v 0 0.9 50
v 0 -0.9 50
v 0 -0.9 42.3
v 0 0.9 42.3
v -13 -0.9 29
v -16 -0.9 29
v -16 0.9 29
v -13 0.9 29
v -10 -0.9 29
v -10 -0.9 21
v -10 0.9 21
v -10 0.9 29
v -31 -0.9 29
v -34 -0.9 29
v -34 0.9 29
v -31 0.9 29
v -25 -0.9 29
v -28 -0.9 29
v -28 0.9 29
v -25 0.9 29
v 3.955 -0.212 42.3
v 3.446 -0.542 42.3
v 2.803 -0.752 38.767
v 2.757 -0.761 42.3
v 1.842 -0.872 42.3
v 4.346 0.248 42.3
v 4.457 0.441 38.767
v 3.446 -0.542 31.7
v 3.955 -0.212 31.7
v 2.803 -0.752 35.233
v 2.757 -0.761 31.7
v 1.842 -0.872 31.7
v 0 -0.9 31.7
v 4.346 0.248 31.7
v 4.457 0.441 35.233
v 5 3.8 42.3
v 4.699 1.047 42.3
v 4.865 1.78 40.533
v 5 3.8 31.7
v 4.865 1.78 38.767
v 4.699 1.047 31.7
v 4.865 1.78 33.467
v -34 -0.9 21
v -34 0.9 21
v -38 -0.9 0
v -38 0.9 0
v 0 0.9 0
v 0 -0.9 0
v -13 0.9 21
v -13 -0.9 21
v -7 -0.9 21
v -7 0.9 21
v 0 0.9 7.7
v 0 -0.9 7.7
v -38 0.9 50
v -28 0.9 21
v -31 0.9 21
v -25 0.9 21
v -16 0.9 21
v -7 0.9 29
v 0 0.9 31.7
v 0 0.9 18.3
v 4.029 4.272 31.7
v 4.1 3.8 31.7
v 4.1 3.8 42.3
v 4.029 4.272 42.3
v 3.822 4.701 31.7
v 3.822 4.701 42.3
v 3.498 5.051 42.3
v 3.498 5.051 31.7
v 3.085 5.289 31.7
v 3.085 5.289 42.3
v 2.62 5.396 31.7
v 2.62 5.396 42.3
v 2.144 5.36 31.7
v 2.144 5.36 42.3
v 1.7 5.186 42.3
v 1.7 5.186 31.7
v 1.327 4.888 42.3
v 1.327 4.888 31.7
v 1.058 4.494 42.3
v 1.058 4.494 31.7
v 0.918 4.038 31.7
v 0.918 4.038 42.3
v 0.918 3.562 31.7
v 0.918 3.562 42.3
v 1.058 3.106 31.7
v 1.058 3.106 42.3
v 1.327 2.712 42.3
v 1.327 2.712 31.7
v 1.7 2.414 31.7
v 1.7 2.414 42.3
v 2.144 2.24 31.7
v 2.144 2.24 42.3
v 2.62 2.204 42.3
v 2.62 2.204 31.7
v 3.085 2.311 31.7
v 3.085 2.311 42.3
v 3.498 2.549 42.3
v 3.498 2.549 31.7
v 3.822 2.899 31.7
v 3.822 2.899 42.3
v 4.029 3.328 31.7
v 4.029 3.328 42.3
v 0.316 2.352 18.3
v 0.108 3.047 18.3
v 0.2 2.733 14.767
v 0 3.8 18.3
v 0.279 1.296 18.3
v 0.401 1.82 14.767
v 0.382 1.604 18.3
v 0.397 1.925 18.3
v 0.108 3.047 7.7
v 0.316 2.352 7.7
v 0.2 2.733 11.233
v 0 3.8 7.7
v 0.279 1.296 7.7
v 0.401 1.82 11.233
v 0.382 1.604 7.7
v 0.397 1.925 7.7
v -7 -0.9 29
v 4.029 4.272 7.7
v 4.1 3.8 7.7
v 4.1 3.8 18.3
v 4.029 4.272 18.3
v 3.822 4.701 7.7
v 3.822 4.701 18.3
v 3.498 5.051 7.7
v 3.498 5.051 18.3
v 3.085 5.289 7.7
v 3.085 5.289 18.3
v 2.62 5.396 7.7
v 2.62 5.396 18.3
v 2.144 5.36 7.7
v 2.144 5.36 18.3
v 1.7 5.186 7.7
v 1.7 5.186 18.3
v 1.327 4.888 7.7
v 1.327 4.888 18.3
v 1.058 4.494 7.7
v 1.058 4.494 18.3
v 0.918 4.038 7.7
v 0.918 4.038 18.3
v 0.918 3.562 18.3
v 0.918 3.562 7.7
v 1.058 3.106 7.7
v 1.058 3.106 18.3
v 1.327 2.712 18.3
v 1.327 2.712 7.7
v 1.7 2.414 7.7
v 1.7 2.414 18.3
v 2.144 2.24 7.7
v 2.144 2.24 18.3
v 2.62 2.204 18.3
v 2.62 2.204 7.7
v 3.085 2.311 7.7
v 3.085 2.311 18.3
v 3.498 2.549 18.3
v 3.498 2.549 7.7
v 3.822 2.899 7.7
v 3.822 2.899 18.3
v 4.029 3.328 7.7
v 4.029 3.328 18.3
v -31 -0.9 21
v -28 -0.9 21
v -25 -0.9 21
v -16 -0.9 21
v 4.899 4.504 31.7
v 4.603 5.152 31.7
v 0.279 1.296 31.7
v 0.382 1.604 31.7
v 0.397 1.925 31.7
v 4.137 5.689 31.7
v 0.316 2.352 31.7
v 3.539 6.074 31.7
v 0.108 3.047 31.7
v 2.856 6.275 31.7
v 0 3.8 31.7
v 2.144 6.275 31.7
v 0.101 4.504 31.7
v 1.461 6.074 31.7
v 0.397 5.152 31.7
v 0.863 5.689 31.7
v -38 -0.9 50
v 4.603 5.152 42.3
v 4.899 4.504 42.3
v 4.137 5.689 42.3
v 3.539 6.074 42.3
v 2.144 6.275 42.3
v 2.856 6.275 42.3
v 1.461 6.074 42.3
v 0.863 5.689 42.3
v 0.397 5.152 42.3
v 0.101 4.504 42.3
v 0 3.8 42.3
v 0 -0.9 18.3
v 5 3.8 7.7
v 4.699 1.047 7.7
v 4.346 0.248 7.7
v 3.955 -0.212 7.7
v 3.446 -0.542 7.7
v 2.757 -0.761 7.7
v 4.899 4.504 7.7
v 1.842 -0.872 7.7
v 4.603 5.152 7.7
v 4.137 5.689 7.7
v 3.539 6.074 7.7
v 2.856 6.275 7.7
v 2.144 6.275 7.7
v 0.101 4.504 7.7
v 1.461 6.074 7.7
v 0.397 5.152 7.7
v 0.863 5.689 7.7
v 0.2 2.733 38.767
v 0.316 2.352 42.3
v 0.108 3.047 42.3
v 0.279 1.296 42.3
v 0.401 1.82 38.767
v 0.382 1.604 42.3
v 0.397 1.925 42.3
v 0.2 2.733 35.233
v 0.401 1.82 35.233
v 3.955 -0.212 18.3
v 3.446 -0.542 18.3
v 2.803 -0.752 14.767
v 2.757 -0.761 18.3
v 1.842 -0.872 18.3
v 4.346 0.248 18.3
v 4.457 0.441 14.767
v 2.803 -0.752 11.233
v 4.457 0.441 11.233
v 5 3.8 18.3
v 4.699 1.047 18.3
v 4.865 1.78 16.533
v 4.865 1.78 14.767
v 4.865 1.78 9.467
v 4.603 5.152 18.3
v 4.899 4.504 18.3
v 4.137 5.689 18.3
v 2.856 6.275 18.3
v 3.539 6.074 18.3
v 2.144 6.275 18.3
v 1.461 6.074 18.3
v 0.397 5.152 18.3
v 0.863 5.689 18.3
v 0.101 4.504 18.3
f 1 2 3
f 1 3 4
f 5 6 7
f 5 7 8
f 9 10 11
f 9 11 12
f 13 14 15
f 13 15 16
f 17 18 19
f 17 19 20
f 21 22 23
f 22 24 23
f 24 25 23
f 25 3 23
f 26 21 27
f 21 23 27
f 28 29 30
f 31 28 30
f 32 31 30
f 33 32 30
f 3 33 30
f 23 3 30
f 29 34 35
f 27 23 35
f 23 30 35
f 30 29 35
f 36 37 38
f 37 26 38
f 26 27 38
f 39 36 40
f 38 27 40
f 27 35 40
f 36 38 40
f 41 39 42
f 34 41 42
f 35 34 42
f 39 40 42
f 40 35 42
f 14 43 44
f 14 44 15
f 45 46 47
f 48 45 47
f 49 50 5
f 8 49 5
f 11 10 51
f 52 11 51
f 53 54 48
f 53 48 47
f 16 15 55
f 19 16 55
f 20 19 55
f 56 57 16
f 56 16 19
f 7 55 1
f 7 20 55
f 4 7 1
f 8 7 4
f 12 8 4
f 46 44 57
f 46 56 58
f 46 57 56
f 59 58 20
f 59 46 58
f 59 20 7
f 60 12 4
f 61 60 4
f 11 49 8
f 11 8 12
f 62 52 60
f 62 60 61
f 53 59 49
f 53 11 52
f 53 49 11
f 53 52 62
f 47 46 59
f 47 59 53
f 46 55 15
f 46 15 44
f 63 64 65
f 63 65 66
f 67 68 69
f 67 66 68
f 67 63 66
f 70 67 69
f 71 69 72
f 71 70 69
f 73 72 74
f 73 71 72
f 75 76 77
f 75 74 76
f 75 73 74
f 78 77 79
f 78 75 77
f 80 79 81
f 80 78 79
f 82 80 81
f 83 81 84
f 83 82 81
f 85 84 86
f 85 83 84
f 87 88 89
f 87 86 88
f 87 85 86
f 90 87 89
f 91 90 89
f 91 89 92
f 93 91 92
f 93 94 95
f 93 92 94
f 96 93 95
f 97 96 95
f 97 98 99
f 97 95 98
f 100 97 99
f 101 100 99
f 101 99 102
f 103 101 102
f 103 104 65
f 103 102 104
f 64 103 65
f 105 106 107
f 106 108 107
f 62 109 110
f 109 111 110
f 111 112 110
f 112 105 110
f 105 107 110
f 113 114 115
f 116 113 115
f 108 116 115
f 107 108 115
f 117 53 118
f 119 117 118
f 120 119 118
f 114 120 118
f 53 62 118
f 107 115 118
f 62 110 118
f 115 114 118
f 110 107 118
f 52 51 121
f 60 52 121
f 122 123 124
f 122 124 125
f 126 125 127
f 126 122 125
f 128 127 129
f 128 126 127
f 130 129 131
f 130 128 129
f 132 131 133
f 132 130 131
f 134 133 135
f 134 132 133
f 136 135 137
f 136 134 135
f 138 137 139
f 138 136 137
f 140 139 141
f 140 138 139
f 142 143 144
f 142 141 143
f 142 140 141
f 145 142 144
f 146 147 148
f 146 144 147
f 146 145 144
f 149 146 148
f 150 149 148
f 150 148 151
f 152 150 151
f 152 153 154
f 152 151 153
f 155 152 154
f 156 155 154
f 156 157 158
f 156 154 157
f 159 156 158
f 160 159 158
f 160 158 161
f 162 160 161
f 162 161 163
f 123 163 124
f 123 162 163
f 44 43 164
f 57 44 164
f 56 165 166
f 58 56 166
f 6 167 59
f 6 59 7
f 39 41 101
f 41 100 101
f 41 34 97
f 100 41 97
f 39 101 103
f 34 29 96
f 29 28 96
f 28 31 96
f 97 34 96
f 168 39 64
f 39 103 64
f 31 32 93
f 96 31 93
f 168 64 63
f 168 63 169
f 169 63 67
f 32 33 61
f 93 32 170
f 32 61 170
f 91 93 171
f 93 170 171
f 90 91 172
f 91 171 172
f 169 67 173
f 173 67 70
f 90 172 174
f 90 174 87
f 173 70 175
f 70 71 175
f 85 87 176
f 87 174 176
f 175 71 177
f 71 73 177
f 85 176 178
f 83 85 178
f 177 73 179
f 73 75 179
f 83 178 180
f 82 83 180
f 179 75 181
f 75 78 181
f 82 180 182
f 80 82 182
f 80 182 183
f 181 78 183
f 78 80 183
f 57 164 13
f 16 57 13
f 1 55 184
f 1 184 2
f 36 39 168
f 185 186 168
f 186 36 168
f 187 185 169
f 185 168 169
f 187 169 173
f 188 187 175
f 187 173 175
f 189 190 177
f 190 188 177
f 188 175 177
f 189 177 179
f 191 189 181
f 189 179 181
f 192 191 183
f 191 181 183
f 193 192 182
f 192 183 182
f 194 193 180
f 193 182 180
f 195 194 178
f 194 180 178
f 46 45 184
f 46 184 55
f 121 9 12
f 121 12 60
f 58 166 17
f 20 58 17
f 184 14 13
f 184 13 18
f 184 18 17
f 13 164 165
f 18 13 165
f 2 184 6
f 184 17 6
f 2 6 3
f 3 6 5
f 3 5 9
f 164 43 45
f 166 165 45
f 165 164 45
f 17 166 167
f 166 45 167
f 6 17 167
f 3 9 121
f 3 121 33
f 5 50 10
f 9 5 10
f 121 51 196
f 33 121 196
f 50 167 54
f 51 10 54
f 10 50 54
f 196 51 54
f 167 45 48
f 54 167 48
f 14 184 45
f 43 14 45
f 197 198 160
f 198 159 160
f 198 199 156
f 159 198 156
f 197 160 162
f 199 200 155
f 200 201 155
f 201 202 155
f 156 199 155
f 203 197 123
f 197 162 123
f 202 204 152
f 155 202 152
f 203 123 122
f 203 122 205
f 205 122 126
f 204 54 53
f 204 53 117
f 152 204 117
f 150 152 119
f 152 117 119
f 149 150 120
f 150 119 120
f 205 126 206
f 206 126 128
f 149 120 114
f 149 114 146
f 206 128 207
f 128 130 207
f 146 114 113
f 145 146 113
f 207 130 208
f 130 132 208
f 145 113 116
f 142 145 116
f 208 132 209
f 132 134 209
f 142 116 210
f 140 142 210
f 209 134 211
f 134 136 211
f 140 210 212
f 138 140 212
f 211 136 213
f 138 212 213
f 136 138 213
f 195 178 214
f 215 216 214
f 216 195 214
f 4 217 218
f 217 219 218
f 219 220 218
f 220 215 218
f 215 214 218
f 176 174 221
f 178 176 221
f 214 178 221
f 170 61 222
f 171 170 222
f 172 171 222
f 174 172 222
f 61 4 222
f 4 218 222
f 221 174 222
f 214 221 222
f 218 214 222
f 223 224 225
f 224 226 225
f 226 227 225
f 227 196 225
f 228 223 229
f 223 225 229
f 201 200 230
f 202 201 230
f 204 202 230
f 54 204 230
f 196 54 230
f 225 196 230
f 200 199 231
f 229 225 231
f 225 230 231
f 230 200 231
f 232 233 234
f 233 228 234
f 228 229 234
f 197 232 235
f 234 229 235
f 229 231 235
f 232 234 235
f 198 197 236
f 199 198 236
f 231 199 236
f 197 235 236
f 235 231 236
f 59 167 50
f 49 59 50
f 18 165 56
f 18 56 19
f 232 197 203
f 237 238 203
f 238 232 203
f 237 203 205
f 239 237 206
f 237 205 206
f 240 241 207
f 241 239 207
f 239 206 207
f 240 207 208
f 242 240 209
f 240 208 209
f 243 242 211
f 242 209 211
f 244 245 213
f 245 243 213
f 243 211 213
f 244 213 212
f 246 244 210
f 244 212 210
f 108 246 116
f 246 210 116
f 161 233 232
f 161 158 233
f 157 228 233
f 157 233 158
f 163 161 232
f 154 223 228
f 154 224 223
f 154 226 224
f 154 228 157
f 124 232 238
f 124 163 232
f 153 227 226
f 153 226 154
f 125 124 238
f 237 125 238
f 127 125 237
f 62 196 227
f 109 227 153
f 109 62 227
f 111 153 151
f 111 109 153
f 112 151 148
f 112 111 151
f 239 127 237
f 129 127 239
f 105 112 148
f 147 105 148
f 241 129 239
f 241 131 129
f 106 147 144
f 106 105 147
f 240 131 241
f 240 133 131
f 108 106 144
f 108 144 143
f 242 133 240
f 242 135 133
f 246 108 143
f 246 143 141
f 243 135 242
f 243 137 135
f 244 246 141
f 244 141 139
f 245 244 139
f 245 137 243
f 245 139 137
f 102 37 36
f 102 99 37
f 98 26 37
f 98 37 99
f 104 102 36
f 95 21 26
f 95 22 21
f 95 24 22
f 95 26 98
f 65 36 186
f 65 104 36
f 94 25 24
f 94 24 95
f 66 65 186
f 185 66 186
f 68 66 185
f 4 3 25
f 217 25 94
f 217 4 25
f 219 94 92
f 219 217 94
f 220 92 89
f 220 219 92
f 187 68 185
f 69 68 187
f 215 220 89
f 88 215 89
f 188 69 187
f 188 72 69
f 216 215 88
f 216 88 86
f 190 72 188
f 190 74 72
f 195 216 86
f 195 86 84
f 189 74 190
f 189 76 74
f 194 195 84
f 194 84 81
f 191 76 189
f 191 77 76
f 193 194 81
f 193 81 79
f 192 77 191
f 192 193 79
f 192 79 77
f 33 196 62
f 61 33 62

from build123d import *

# Parameters (mm, degrees)
F0_W     = 38
F0_H     = 1.8
F0_R     = 1.6
F1_DEPTH = 50
F2_W     = 39.500002
F2_H     = 7.7
F2_H_2   = 13.4
F2_W_2   = 59.247335
F2_H_3   = 31.547058
F3_DEPTH = 25
F4_W     = 3
F4_H     = 8
F5_DEPTH = 1.8


with BuildPart() as f1:
    # F0 (on Top) → F1 (new body)
    with BuildSketch(Plane.XY):
        with Locations((-19, 0)):
            Rectangle(F0_W, F0_H)
        with BuildLine():
            add(Edge.make_bspline(
                [(0, 3.8), (0, 2.602653), (0.90178, 1.877582), (0, 0.9)],
                knots=[0, 0, 0, 0, 2.9, 2.9, 2.9, 2.9], degree=3))
            Line((0, 0.9), (0, -0.9))
            add(Edge.make_bspline(
                [(0, -0.9), (3.389107, -0.9), (5, -1.015936), (5, 3.8)],
                knots=[0, 0, 0, 0, 6.862215, 6.862215, 6.862215, 6.862215], degree=3))
            ThreePointArc((5, 3.8), (2.5, 6.3), (0, 3.8))
        make_face()
        with Locations((2.5, 3.8)):
            Circle(F0_R, mode=Mode.SUBTRACT)
    extrude(amount=F1_DEPTH)

    # F2 (on Right) → F3 (cut)
    with BuildSketch(Plane.YZ):
        with Locations((1.306903, 3.85)):
            Rectangle(F2_W, F2_H)
        with Locations((0.349251, 25)):
            Rectangle(F2_W, F2_H_2)
        with Locations((-2.001637, 58.073529)):
            Rectangle(F2_W_2, F2_H_3)
    extrude(amount=F3_DEPTH, mode=Mode.SUBTRACT)

    # F4 (on face) → F5 (cut, through all)
    with BuildSketch(Plane.XZ.offset(0.9)):
        with Locations((-32.5, 25)):
            Rectangle(F4_W, F4_H)
        with Locations((-26.5, 25)):
            Rectangle(F4_W, F4_H)
        with Locations((-14.5, 25)):
            Rectangle(F4_W, F4_H)
        with Locations((-8.5, 25)):
            Rectangle(F4_W, F4_H)
    extrude(amount=-F5_DEPTH, mode=Mode.SUBTRACT)


solid = f1.part
